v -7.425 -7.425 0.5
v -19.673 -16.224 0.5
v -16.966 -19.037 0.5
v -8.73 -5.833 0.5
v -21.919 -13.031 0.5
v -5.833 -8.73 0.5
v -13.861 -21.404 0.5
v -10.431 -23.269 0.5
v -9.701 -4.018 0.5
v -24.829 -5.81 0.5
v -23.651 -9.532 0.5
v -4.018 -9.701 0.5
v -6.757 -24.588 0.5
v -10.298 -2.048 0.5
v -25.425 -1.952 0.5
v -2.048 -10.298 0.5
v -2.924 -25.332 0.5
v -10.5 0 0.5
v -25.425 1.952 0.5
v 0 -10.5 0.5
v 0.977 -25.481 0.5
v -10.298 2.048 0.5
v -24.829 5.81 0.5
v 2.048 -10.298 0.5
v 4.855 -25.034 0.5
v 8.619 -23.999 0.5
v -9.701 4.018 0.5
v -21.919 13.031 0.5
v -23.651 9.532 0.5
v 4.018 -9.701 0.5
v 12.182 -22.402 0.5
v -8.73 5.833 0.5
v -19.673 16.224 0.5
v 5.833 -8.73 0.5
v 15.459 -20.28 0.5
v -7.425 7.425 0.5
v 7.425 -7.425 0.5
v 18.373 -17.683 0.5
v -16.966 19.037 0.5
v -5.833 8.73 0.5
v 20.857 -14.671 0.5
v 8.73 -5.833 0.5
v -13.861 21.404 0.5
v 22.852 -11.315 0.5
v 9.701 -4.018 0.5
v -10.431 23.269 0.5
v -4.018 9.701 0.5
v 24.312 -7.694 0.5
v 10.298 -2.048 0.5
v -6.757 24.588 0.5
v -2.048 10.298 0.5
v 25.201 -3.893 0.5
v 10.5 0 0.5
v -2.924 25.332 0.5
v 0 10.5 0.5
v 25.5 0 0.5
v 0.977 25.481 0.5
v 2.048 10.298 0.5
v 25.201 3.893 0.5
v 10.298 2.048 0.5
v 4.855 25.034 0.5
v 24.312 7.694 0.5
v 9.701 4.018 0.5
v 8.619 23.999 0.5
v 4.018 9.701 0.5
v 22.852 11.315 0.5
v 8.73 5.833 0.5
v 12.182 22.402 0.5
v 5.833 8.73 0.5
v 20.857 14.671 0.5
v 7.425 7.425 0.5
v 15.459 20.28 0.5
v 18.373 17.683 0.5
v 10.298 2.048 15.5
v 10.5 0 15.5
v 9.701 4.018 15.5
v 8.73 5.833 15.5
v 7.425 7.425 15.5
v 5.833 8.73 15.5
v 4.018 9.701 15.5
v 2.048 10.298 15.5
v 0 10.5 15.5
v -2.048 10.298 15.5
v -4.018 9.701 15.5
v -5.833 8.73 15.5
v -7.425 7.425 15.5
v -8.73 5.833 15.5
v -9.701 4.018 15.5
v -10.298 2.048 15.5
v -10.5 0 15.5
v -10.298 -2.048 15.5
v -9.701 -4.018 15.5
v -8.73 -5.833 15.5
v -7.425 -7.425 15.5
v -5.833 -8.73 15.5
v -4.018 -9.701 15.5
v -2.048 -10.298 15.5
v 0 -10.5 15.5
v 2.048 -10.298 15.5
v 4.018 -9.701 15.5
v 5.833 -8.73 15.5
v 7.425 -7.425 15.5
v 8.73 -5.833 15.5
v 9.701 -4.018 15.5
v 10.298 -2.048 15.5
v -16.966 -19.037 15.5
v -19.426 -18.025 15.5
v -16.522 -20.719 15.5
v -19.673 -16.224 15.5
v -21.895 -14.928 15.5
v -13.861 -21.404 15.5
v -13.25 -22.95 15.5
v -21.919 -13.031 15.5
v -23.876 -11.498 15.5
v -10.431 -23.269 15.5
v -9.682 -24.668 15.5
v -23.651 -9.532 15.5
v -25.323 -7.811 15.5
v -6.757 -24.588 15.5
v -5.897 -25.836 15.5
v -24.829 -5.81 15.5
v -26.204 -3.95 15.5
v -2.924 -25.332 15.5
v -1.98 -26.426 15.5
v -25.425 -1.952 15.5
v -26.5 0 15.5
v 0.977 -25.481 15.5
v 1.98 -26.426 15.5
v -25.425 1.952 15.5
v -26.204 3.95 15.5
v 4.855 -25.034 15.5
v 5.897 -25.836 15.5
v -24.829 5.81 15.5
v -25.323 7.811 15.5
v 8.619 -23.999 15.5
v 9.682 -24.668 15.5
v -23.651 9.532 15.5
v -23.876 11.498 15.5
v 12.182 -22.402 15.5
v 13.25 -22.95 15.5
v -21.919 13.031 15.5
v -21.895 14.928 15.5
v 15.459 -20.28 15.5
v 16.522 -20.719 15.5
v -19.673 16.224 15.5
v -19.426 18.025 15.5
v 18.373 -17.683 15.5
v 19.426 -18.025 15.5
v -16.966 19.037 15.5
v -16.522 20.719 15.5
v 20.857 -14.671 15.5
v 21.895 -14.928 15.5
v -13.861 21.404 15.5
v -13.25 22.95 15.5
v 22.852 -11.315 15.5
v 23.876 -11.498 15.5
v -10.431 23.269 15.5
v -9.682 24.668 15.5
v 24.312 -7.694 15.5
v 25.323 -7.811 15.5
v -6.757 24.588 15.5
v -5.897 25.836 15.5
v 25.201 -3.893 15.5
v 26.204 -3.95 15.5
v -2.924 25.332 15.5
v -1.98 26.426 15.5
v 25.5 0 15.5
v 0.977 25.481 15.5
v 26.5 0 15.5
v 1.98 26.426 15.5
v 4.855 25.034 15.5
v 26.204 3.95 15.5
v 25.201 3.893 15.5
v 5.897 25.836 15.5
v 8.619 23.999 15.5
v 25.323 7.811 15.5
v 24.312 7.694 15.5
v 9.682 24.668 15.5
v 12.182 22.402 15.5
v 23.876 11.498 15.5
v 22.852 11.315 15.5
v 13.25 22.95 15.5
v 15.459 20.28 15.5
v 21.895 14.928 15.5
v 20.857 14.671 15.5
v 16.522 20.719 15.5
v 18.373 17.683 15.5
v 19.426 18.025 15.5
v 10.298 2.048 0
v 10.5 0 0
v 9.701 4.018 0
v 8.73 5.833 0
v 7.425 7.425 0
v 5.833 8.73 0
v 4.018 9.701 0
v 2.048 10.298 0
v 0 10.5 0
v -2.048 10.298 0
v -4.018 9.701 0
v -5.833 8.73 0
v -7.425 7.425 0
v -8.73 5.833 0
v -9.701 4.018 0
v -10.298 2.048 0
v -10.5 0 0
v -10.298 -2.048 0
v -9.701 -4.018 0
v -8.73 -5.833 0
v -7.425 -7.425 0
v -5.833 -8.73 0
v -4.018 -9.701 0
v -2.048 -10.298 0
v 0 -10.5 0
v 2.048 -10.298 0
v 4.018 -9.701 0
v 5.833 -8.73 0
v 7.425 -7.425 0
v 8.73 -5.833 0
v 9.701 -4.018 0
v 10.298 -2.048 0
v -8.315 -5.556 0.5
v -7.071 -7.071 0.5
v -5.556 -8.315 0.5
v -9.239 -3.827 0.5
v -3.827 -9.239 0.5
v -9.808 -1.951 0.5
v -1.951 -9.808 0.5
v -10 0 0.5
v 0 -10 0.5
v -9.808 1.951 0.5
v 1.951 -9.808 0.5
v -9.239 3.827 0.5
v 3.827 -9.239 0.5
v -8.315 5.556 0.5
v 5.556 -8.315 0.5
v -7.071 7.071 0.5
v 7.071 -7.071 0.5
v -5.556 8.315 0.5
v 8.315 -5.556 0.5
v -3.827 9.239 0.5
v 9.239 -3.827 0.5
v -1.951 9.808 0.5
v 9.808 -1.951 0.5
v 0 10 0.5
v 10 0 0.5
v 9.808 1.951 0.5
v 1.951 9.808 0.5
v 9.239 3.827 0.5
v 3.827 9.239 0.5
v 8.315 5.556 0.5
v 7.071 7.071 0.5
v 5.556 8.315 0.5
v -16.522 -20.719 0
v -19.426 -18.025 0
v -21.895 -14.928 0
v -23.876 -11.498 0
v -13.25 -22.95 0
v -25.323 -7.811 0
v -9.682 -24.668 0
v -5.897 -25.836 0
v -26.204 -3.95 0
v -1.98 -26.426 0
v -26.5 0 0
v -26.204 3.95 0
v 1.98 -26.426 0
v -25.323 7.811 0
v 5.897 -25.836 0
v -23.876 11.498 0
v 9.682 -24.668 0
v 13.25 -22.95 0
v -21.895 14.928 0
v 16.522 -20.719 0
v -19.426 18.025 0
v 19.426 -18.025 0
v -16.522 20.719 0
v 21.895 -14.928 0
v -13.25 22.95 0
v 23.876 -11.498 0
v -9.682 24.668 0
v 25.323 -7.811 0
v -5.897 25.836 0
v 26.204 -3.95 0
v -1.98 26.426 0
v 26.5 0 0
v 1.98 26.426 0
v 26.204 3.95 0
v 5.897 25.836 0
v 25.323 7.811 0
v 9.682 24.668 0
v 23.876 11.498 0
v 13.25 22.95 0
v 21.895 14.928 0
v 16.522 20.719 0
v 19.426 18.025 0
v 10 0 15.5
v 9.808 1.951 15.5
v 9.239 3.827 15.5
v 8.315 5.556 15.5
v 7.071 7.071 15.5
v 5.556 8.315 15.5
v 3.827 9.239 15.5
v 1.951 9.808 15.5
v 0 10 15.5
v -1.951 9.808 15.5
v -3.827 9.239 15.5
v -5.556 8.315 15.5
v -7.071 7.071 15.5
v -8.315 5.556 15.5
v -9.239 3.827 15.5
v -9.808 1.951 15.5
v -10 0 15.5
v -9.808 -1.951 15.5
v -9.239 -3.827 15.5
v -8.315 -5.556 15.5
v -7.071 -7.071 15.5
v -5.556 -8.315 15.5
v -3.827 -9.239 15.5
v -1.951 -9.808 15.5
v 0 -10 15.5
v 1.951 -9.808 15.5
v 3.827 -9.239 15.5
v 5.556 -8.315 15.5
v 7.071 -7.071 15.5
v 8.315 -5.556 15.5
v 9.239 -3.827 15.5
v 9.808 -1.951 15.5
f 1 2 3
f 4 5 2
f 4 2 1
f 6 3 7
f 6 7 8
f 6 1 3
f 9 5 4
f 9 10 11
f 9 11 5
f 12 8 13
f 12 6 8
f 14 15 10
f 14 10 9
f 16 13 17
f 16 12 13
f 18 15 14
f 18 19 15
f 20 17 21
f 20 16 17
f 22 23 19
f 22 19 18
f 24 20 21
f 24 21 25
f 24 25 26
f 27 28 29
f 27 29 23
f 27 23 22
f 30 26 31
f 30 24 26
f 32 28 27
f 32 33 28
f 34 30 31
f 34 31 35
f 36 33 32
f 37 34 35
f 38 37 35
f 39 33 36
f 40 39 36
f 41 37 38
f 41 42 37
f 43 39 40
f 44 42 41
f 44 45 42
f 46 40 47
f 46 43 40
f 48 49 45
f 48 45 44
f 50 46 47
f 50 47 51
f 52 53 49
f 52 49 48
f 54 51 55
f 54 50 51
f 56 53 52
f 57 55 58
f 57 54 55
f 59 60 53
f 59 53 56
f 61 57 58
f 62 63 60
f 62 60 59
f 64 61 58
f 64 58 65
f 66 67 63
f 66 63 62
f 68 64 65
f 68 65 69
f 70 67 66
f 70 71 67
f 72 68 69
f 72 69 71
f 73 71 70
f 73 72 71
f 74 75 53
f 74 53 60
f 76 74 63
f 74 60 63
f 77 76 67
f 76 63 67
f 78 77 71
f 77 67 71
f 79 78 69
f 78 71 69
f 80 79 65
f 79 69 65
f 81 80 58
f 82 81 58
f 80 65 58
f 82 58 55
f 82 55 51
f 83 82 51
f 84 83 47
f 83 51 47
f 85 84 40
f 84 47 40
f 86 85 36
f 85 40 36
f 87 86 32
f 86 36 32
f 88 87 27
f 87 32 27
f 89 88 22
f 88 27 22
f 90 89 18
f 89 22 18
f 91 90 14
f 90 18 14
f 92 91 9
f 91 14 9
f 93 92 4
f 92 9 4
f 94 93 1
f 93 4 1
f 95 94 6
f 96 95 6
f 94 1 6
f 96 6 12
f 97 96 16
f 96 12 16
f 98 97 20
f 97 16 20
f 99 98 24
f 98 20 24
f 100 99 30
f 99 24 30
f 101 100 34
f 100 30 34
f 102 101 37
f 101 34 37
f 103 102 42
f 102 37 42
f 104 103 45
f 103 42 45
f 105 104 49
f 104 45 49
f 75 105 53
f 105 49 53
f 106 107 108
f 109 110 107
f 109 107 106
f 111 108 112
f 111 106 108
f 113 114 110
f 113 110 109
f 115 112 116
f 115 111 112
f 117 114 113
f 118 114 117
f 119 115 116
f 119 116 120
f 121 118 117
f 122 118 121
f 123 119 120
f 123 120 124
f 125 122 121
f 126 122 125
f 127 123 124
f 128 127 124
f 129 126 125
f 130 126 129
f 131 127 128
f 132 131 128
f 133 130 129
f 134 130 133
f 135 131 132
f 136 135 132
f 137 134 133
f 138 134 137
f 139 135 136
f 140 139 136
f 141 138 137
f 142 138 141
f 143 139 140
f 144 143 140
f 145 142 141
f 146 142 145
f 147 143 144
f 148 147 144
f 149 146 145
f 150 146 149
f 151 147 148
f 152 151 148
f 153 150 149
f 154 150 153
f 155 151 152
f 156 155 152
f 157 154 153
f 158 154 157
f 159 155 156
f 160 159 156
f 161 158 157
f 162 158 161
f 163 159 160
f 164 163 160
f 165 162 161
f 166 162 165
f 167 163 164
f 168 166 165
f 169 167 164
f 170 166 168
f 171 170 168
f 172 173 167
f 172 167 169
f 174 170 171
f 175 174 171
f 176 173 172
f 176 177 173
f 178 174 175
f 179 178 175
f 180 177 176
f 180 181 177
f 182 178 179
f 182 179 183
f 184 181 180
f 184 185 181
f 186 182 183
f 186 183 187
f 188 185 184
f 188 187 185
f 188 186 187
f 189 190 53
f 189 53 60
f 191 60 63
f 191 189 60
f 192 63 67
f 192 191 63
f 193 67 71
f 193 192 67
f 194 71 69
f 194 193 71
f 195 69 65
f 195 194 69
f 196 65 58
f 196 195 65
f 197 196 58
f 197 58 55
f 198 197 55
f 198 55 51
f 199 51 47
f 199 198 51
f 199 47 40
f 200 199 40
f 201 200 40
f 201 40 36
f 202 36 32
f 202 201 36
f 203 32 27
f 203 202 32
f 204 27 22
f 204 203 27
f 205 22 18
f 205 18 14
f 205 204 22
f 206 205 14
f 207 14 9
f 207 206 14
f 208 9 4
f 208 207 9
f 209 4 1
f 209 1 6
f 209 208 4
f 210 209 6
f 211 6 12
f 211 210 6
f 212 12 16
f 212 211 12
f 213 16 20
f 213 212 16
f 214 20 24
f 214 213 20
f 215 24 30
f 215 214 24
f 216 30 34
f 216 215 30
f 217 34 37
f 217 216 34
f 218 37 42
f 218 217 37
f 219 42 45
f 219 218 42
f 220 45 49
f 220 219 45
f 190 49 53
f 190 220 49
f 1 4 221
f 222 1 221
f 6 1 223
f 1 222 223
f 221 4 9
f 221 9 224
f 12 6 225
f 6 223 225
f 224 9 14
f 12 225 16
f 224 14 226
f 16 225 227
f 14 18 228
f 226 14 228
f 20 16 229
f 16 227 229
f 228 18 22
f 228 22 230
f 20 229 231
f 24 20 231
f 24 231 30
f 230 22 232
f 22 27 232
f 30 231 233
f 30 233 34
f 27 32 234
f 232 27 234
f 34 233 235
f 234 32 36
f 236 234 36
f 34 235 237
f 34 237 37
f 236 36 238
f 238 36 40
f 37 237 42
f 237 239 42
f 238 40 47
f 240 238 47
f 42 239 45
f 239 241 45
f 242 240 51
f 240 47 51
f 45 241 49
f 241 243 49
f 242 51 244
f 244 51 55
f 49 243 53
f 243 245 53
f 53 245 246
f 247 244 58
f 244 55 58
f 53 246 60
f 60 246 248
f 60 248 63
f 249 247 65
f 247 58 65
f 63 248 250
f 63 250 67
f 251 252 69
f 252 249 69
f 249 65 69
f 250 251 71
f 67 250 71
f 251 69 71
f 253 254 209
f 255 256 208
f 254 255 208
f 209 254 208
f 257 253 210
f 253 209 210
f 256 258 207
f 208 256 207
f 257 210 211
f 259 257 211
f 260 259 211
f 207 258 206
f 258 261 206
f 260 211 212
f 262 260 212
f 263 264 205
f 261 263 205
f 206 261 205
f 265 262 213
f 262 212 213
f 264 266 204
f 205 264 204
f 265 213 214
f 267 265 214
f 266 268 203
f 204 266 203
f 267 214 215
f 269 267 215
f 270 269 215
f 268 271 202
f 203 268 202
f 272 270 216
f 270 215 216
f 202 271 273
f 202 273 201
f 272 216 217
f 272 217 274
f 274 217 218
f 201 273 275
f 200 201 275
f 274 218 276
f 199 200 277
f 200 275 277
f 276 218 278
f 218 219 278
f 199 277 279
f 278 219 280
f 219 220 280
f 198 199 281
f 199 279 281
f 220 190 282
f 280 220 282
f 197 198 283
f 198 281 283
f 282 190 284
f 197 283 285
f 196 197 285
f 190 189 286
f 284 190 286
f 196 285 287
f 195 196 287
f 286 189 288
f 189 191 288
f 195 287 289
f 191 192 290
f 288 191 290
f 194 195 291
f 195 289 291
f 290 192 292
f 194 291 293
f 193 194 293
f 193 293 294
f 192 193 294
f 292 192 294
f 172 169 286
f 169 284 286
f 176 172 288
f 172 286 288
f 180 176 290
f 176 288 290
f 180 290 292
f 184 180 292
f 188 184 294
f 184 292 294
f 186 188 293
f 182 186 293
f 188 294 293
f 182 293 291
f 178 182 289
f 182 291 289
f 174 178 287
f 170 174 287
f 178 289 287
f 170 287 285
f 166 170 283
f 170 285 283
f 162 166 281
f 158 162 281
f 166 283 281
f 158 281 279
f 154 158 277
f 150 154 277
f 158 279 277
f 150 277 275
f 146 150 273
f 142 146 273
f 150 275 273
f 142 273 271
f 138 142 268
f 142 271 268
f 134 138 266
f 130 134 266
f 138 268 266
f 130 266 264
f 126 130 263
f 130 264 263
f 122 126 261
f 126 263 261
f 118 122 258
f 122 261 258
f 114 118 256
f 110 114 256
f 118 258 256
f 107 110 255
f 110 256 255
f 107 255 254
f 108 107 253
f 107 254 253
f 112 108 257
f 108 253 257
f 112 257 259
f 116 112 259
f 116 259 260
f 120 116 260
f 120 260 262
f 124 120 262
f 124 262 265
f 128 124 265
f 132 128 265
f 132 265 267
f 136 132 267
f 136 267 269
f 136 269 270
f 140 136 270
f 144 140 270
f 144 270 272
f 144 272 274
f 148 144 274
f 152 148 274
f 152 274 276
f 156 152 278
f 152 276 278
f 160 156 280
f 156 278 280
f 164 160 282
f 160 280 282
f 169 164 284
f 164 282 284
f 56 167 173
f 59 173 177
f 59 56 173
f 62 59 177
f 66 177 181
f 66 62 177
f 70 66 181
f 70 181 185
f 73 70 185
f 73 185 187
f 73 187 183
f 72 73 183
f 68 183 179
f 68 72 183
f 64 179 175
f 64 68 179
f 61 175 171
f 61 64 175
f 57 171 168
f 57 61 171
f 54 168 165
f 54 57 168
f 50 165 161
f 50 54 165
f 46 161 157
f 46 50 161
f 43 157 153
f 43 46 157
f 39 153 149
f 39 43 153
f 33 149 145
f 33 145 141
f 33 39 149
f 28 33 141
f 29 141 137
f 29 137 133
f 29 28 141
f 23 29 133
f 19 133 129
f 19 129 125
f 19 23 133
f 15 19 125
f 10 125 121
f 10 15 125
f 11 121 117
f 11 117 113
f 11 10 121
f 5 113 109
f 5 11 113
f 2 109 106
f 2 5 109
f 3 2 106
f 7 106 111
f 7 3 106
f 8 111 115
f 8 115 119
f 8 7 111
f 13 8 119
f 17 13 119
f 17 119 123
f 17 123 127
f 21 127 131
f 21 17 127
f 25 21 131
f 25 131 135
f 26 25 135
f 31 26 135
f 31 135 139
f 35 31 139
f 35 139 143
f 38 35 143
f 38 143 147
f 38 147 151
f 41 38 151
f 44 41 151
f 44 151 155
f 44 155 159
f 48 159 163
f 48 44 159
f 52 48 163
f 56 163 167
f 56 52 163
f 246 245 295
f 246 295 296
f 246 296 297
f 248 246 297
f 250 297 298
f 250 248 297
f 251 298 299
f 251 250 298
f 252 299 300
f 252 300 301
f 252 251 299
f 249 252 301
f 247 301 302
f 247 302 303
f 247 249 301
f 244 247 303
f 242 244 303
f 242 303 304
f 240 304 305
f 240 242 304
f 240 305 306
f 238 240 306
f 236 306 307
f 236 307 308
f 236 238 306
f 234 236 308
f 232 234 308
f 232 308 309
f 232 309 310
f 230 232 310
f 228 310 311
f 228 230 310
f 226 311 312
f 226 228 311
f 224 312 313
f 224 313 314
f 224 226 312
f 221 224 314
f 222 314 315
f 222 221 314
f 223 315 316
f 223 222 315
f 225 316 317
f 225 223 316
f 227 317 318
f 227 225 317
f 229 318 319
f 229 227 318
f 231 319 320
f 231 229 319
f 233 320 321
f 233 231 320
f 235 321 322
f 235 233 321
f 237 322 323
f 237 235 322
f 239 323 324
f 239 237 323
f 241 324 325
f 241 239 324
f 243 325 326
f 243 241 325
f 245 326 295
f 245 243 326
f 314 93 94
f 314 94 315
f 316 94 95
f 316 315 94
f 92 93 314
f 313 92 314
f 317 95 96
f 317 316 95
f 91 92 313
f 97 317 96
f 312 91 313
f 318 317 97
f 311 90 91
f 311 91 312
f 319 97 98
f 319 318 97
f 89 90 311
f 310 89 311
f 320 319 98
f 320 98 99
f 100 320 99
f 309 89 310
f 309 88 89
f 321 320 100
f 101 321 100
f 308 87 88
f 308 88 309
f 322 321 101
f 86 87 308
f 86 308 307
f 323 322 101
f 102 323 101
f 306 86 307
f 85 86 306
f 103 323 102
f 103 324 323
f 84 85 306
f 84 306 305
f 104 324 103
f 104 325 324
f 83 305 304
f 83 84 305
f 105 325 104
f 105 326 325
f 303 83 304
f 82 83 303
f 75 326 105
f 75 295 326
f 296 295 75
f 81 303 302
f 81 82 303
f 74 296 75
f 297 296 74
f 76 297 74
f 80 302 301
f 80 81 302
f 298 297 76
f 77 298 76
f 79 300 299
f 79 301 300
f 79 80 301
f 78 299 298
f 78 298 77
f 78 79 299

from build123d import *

# Parameters (mm, degrees)
SKETCH1_R           = 26.5
SKETCH1_R_2         = 10.5
BOSS_EXTRUDE2_DEPTH = 0.5
SKETCH2_R           = 26.5
SKETCH2_R_2         = 25.5
SKETCH2_R_3         = 10.5
SKETCH2_R_4         = 10
BOSS_EXTRUDE3_DEPTH = 15


with BuildPart() as part:
    # Sketch1 → Boss-Extrude2 (new body)
    with BuildSketch(Plane.XY):
        Circle(SKETCH1_R)
        Circle(SKETCH1_R_2, mode=Mode.SUBTRACT)
    extrude(amount=BOSS_EXTRUDE2_DEPTH)

    # Sketch2 → Boss-Extrude3 (add)
    # profile 1 of 2: a face of its own
    with BuildSketch(Plane.XY.offset(0.5)):
        Circle(SKETCH2_R)
        Circle(SKETCH2_R_2, mode=Mode.SUBTRACT)
    # profile 2 of 2: a face of its own
    with BuildSketch(Plane.XY.offset(0.5)):
        Circle(SKETCH2_R_3)
        Circle(SKETCH2_R_4, mode=Mode.SUBTRACT)
    extrude(amount=BOSS_EXTRUDE3_DEPTH)


with BuildPart() as boss_extrude3_piece_1:
    # of the separate pieces the step leaves, piece 1, a body of its own (boss_extrude3_pieces)
    add(part.part.solids().sort_by_distance((26.5, 0, 0))[0])


with BuildPart() as boss_extrude3_piece_2:
    # of the separate pieces the step leaves, piece 2, a body of its own (boss_extrude3_pieces)
    add(part.part.solids().sort_by_distance((10.5, 0, 15.5))[0])


solid = Compound([boss_extrude3_piece_1.part, boss_extrude3_piece_2.part])
